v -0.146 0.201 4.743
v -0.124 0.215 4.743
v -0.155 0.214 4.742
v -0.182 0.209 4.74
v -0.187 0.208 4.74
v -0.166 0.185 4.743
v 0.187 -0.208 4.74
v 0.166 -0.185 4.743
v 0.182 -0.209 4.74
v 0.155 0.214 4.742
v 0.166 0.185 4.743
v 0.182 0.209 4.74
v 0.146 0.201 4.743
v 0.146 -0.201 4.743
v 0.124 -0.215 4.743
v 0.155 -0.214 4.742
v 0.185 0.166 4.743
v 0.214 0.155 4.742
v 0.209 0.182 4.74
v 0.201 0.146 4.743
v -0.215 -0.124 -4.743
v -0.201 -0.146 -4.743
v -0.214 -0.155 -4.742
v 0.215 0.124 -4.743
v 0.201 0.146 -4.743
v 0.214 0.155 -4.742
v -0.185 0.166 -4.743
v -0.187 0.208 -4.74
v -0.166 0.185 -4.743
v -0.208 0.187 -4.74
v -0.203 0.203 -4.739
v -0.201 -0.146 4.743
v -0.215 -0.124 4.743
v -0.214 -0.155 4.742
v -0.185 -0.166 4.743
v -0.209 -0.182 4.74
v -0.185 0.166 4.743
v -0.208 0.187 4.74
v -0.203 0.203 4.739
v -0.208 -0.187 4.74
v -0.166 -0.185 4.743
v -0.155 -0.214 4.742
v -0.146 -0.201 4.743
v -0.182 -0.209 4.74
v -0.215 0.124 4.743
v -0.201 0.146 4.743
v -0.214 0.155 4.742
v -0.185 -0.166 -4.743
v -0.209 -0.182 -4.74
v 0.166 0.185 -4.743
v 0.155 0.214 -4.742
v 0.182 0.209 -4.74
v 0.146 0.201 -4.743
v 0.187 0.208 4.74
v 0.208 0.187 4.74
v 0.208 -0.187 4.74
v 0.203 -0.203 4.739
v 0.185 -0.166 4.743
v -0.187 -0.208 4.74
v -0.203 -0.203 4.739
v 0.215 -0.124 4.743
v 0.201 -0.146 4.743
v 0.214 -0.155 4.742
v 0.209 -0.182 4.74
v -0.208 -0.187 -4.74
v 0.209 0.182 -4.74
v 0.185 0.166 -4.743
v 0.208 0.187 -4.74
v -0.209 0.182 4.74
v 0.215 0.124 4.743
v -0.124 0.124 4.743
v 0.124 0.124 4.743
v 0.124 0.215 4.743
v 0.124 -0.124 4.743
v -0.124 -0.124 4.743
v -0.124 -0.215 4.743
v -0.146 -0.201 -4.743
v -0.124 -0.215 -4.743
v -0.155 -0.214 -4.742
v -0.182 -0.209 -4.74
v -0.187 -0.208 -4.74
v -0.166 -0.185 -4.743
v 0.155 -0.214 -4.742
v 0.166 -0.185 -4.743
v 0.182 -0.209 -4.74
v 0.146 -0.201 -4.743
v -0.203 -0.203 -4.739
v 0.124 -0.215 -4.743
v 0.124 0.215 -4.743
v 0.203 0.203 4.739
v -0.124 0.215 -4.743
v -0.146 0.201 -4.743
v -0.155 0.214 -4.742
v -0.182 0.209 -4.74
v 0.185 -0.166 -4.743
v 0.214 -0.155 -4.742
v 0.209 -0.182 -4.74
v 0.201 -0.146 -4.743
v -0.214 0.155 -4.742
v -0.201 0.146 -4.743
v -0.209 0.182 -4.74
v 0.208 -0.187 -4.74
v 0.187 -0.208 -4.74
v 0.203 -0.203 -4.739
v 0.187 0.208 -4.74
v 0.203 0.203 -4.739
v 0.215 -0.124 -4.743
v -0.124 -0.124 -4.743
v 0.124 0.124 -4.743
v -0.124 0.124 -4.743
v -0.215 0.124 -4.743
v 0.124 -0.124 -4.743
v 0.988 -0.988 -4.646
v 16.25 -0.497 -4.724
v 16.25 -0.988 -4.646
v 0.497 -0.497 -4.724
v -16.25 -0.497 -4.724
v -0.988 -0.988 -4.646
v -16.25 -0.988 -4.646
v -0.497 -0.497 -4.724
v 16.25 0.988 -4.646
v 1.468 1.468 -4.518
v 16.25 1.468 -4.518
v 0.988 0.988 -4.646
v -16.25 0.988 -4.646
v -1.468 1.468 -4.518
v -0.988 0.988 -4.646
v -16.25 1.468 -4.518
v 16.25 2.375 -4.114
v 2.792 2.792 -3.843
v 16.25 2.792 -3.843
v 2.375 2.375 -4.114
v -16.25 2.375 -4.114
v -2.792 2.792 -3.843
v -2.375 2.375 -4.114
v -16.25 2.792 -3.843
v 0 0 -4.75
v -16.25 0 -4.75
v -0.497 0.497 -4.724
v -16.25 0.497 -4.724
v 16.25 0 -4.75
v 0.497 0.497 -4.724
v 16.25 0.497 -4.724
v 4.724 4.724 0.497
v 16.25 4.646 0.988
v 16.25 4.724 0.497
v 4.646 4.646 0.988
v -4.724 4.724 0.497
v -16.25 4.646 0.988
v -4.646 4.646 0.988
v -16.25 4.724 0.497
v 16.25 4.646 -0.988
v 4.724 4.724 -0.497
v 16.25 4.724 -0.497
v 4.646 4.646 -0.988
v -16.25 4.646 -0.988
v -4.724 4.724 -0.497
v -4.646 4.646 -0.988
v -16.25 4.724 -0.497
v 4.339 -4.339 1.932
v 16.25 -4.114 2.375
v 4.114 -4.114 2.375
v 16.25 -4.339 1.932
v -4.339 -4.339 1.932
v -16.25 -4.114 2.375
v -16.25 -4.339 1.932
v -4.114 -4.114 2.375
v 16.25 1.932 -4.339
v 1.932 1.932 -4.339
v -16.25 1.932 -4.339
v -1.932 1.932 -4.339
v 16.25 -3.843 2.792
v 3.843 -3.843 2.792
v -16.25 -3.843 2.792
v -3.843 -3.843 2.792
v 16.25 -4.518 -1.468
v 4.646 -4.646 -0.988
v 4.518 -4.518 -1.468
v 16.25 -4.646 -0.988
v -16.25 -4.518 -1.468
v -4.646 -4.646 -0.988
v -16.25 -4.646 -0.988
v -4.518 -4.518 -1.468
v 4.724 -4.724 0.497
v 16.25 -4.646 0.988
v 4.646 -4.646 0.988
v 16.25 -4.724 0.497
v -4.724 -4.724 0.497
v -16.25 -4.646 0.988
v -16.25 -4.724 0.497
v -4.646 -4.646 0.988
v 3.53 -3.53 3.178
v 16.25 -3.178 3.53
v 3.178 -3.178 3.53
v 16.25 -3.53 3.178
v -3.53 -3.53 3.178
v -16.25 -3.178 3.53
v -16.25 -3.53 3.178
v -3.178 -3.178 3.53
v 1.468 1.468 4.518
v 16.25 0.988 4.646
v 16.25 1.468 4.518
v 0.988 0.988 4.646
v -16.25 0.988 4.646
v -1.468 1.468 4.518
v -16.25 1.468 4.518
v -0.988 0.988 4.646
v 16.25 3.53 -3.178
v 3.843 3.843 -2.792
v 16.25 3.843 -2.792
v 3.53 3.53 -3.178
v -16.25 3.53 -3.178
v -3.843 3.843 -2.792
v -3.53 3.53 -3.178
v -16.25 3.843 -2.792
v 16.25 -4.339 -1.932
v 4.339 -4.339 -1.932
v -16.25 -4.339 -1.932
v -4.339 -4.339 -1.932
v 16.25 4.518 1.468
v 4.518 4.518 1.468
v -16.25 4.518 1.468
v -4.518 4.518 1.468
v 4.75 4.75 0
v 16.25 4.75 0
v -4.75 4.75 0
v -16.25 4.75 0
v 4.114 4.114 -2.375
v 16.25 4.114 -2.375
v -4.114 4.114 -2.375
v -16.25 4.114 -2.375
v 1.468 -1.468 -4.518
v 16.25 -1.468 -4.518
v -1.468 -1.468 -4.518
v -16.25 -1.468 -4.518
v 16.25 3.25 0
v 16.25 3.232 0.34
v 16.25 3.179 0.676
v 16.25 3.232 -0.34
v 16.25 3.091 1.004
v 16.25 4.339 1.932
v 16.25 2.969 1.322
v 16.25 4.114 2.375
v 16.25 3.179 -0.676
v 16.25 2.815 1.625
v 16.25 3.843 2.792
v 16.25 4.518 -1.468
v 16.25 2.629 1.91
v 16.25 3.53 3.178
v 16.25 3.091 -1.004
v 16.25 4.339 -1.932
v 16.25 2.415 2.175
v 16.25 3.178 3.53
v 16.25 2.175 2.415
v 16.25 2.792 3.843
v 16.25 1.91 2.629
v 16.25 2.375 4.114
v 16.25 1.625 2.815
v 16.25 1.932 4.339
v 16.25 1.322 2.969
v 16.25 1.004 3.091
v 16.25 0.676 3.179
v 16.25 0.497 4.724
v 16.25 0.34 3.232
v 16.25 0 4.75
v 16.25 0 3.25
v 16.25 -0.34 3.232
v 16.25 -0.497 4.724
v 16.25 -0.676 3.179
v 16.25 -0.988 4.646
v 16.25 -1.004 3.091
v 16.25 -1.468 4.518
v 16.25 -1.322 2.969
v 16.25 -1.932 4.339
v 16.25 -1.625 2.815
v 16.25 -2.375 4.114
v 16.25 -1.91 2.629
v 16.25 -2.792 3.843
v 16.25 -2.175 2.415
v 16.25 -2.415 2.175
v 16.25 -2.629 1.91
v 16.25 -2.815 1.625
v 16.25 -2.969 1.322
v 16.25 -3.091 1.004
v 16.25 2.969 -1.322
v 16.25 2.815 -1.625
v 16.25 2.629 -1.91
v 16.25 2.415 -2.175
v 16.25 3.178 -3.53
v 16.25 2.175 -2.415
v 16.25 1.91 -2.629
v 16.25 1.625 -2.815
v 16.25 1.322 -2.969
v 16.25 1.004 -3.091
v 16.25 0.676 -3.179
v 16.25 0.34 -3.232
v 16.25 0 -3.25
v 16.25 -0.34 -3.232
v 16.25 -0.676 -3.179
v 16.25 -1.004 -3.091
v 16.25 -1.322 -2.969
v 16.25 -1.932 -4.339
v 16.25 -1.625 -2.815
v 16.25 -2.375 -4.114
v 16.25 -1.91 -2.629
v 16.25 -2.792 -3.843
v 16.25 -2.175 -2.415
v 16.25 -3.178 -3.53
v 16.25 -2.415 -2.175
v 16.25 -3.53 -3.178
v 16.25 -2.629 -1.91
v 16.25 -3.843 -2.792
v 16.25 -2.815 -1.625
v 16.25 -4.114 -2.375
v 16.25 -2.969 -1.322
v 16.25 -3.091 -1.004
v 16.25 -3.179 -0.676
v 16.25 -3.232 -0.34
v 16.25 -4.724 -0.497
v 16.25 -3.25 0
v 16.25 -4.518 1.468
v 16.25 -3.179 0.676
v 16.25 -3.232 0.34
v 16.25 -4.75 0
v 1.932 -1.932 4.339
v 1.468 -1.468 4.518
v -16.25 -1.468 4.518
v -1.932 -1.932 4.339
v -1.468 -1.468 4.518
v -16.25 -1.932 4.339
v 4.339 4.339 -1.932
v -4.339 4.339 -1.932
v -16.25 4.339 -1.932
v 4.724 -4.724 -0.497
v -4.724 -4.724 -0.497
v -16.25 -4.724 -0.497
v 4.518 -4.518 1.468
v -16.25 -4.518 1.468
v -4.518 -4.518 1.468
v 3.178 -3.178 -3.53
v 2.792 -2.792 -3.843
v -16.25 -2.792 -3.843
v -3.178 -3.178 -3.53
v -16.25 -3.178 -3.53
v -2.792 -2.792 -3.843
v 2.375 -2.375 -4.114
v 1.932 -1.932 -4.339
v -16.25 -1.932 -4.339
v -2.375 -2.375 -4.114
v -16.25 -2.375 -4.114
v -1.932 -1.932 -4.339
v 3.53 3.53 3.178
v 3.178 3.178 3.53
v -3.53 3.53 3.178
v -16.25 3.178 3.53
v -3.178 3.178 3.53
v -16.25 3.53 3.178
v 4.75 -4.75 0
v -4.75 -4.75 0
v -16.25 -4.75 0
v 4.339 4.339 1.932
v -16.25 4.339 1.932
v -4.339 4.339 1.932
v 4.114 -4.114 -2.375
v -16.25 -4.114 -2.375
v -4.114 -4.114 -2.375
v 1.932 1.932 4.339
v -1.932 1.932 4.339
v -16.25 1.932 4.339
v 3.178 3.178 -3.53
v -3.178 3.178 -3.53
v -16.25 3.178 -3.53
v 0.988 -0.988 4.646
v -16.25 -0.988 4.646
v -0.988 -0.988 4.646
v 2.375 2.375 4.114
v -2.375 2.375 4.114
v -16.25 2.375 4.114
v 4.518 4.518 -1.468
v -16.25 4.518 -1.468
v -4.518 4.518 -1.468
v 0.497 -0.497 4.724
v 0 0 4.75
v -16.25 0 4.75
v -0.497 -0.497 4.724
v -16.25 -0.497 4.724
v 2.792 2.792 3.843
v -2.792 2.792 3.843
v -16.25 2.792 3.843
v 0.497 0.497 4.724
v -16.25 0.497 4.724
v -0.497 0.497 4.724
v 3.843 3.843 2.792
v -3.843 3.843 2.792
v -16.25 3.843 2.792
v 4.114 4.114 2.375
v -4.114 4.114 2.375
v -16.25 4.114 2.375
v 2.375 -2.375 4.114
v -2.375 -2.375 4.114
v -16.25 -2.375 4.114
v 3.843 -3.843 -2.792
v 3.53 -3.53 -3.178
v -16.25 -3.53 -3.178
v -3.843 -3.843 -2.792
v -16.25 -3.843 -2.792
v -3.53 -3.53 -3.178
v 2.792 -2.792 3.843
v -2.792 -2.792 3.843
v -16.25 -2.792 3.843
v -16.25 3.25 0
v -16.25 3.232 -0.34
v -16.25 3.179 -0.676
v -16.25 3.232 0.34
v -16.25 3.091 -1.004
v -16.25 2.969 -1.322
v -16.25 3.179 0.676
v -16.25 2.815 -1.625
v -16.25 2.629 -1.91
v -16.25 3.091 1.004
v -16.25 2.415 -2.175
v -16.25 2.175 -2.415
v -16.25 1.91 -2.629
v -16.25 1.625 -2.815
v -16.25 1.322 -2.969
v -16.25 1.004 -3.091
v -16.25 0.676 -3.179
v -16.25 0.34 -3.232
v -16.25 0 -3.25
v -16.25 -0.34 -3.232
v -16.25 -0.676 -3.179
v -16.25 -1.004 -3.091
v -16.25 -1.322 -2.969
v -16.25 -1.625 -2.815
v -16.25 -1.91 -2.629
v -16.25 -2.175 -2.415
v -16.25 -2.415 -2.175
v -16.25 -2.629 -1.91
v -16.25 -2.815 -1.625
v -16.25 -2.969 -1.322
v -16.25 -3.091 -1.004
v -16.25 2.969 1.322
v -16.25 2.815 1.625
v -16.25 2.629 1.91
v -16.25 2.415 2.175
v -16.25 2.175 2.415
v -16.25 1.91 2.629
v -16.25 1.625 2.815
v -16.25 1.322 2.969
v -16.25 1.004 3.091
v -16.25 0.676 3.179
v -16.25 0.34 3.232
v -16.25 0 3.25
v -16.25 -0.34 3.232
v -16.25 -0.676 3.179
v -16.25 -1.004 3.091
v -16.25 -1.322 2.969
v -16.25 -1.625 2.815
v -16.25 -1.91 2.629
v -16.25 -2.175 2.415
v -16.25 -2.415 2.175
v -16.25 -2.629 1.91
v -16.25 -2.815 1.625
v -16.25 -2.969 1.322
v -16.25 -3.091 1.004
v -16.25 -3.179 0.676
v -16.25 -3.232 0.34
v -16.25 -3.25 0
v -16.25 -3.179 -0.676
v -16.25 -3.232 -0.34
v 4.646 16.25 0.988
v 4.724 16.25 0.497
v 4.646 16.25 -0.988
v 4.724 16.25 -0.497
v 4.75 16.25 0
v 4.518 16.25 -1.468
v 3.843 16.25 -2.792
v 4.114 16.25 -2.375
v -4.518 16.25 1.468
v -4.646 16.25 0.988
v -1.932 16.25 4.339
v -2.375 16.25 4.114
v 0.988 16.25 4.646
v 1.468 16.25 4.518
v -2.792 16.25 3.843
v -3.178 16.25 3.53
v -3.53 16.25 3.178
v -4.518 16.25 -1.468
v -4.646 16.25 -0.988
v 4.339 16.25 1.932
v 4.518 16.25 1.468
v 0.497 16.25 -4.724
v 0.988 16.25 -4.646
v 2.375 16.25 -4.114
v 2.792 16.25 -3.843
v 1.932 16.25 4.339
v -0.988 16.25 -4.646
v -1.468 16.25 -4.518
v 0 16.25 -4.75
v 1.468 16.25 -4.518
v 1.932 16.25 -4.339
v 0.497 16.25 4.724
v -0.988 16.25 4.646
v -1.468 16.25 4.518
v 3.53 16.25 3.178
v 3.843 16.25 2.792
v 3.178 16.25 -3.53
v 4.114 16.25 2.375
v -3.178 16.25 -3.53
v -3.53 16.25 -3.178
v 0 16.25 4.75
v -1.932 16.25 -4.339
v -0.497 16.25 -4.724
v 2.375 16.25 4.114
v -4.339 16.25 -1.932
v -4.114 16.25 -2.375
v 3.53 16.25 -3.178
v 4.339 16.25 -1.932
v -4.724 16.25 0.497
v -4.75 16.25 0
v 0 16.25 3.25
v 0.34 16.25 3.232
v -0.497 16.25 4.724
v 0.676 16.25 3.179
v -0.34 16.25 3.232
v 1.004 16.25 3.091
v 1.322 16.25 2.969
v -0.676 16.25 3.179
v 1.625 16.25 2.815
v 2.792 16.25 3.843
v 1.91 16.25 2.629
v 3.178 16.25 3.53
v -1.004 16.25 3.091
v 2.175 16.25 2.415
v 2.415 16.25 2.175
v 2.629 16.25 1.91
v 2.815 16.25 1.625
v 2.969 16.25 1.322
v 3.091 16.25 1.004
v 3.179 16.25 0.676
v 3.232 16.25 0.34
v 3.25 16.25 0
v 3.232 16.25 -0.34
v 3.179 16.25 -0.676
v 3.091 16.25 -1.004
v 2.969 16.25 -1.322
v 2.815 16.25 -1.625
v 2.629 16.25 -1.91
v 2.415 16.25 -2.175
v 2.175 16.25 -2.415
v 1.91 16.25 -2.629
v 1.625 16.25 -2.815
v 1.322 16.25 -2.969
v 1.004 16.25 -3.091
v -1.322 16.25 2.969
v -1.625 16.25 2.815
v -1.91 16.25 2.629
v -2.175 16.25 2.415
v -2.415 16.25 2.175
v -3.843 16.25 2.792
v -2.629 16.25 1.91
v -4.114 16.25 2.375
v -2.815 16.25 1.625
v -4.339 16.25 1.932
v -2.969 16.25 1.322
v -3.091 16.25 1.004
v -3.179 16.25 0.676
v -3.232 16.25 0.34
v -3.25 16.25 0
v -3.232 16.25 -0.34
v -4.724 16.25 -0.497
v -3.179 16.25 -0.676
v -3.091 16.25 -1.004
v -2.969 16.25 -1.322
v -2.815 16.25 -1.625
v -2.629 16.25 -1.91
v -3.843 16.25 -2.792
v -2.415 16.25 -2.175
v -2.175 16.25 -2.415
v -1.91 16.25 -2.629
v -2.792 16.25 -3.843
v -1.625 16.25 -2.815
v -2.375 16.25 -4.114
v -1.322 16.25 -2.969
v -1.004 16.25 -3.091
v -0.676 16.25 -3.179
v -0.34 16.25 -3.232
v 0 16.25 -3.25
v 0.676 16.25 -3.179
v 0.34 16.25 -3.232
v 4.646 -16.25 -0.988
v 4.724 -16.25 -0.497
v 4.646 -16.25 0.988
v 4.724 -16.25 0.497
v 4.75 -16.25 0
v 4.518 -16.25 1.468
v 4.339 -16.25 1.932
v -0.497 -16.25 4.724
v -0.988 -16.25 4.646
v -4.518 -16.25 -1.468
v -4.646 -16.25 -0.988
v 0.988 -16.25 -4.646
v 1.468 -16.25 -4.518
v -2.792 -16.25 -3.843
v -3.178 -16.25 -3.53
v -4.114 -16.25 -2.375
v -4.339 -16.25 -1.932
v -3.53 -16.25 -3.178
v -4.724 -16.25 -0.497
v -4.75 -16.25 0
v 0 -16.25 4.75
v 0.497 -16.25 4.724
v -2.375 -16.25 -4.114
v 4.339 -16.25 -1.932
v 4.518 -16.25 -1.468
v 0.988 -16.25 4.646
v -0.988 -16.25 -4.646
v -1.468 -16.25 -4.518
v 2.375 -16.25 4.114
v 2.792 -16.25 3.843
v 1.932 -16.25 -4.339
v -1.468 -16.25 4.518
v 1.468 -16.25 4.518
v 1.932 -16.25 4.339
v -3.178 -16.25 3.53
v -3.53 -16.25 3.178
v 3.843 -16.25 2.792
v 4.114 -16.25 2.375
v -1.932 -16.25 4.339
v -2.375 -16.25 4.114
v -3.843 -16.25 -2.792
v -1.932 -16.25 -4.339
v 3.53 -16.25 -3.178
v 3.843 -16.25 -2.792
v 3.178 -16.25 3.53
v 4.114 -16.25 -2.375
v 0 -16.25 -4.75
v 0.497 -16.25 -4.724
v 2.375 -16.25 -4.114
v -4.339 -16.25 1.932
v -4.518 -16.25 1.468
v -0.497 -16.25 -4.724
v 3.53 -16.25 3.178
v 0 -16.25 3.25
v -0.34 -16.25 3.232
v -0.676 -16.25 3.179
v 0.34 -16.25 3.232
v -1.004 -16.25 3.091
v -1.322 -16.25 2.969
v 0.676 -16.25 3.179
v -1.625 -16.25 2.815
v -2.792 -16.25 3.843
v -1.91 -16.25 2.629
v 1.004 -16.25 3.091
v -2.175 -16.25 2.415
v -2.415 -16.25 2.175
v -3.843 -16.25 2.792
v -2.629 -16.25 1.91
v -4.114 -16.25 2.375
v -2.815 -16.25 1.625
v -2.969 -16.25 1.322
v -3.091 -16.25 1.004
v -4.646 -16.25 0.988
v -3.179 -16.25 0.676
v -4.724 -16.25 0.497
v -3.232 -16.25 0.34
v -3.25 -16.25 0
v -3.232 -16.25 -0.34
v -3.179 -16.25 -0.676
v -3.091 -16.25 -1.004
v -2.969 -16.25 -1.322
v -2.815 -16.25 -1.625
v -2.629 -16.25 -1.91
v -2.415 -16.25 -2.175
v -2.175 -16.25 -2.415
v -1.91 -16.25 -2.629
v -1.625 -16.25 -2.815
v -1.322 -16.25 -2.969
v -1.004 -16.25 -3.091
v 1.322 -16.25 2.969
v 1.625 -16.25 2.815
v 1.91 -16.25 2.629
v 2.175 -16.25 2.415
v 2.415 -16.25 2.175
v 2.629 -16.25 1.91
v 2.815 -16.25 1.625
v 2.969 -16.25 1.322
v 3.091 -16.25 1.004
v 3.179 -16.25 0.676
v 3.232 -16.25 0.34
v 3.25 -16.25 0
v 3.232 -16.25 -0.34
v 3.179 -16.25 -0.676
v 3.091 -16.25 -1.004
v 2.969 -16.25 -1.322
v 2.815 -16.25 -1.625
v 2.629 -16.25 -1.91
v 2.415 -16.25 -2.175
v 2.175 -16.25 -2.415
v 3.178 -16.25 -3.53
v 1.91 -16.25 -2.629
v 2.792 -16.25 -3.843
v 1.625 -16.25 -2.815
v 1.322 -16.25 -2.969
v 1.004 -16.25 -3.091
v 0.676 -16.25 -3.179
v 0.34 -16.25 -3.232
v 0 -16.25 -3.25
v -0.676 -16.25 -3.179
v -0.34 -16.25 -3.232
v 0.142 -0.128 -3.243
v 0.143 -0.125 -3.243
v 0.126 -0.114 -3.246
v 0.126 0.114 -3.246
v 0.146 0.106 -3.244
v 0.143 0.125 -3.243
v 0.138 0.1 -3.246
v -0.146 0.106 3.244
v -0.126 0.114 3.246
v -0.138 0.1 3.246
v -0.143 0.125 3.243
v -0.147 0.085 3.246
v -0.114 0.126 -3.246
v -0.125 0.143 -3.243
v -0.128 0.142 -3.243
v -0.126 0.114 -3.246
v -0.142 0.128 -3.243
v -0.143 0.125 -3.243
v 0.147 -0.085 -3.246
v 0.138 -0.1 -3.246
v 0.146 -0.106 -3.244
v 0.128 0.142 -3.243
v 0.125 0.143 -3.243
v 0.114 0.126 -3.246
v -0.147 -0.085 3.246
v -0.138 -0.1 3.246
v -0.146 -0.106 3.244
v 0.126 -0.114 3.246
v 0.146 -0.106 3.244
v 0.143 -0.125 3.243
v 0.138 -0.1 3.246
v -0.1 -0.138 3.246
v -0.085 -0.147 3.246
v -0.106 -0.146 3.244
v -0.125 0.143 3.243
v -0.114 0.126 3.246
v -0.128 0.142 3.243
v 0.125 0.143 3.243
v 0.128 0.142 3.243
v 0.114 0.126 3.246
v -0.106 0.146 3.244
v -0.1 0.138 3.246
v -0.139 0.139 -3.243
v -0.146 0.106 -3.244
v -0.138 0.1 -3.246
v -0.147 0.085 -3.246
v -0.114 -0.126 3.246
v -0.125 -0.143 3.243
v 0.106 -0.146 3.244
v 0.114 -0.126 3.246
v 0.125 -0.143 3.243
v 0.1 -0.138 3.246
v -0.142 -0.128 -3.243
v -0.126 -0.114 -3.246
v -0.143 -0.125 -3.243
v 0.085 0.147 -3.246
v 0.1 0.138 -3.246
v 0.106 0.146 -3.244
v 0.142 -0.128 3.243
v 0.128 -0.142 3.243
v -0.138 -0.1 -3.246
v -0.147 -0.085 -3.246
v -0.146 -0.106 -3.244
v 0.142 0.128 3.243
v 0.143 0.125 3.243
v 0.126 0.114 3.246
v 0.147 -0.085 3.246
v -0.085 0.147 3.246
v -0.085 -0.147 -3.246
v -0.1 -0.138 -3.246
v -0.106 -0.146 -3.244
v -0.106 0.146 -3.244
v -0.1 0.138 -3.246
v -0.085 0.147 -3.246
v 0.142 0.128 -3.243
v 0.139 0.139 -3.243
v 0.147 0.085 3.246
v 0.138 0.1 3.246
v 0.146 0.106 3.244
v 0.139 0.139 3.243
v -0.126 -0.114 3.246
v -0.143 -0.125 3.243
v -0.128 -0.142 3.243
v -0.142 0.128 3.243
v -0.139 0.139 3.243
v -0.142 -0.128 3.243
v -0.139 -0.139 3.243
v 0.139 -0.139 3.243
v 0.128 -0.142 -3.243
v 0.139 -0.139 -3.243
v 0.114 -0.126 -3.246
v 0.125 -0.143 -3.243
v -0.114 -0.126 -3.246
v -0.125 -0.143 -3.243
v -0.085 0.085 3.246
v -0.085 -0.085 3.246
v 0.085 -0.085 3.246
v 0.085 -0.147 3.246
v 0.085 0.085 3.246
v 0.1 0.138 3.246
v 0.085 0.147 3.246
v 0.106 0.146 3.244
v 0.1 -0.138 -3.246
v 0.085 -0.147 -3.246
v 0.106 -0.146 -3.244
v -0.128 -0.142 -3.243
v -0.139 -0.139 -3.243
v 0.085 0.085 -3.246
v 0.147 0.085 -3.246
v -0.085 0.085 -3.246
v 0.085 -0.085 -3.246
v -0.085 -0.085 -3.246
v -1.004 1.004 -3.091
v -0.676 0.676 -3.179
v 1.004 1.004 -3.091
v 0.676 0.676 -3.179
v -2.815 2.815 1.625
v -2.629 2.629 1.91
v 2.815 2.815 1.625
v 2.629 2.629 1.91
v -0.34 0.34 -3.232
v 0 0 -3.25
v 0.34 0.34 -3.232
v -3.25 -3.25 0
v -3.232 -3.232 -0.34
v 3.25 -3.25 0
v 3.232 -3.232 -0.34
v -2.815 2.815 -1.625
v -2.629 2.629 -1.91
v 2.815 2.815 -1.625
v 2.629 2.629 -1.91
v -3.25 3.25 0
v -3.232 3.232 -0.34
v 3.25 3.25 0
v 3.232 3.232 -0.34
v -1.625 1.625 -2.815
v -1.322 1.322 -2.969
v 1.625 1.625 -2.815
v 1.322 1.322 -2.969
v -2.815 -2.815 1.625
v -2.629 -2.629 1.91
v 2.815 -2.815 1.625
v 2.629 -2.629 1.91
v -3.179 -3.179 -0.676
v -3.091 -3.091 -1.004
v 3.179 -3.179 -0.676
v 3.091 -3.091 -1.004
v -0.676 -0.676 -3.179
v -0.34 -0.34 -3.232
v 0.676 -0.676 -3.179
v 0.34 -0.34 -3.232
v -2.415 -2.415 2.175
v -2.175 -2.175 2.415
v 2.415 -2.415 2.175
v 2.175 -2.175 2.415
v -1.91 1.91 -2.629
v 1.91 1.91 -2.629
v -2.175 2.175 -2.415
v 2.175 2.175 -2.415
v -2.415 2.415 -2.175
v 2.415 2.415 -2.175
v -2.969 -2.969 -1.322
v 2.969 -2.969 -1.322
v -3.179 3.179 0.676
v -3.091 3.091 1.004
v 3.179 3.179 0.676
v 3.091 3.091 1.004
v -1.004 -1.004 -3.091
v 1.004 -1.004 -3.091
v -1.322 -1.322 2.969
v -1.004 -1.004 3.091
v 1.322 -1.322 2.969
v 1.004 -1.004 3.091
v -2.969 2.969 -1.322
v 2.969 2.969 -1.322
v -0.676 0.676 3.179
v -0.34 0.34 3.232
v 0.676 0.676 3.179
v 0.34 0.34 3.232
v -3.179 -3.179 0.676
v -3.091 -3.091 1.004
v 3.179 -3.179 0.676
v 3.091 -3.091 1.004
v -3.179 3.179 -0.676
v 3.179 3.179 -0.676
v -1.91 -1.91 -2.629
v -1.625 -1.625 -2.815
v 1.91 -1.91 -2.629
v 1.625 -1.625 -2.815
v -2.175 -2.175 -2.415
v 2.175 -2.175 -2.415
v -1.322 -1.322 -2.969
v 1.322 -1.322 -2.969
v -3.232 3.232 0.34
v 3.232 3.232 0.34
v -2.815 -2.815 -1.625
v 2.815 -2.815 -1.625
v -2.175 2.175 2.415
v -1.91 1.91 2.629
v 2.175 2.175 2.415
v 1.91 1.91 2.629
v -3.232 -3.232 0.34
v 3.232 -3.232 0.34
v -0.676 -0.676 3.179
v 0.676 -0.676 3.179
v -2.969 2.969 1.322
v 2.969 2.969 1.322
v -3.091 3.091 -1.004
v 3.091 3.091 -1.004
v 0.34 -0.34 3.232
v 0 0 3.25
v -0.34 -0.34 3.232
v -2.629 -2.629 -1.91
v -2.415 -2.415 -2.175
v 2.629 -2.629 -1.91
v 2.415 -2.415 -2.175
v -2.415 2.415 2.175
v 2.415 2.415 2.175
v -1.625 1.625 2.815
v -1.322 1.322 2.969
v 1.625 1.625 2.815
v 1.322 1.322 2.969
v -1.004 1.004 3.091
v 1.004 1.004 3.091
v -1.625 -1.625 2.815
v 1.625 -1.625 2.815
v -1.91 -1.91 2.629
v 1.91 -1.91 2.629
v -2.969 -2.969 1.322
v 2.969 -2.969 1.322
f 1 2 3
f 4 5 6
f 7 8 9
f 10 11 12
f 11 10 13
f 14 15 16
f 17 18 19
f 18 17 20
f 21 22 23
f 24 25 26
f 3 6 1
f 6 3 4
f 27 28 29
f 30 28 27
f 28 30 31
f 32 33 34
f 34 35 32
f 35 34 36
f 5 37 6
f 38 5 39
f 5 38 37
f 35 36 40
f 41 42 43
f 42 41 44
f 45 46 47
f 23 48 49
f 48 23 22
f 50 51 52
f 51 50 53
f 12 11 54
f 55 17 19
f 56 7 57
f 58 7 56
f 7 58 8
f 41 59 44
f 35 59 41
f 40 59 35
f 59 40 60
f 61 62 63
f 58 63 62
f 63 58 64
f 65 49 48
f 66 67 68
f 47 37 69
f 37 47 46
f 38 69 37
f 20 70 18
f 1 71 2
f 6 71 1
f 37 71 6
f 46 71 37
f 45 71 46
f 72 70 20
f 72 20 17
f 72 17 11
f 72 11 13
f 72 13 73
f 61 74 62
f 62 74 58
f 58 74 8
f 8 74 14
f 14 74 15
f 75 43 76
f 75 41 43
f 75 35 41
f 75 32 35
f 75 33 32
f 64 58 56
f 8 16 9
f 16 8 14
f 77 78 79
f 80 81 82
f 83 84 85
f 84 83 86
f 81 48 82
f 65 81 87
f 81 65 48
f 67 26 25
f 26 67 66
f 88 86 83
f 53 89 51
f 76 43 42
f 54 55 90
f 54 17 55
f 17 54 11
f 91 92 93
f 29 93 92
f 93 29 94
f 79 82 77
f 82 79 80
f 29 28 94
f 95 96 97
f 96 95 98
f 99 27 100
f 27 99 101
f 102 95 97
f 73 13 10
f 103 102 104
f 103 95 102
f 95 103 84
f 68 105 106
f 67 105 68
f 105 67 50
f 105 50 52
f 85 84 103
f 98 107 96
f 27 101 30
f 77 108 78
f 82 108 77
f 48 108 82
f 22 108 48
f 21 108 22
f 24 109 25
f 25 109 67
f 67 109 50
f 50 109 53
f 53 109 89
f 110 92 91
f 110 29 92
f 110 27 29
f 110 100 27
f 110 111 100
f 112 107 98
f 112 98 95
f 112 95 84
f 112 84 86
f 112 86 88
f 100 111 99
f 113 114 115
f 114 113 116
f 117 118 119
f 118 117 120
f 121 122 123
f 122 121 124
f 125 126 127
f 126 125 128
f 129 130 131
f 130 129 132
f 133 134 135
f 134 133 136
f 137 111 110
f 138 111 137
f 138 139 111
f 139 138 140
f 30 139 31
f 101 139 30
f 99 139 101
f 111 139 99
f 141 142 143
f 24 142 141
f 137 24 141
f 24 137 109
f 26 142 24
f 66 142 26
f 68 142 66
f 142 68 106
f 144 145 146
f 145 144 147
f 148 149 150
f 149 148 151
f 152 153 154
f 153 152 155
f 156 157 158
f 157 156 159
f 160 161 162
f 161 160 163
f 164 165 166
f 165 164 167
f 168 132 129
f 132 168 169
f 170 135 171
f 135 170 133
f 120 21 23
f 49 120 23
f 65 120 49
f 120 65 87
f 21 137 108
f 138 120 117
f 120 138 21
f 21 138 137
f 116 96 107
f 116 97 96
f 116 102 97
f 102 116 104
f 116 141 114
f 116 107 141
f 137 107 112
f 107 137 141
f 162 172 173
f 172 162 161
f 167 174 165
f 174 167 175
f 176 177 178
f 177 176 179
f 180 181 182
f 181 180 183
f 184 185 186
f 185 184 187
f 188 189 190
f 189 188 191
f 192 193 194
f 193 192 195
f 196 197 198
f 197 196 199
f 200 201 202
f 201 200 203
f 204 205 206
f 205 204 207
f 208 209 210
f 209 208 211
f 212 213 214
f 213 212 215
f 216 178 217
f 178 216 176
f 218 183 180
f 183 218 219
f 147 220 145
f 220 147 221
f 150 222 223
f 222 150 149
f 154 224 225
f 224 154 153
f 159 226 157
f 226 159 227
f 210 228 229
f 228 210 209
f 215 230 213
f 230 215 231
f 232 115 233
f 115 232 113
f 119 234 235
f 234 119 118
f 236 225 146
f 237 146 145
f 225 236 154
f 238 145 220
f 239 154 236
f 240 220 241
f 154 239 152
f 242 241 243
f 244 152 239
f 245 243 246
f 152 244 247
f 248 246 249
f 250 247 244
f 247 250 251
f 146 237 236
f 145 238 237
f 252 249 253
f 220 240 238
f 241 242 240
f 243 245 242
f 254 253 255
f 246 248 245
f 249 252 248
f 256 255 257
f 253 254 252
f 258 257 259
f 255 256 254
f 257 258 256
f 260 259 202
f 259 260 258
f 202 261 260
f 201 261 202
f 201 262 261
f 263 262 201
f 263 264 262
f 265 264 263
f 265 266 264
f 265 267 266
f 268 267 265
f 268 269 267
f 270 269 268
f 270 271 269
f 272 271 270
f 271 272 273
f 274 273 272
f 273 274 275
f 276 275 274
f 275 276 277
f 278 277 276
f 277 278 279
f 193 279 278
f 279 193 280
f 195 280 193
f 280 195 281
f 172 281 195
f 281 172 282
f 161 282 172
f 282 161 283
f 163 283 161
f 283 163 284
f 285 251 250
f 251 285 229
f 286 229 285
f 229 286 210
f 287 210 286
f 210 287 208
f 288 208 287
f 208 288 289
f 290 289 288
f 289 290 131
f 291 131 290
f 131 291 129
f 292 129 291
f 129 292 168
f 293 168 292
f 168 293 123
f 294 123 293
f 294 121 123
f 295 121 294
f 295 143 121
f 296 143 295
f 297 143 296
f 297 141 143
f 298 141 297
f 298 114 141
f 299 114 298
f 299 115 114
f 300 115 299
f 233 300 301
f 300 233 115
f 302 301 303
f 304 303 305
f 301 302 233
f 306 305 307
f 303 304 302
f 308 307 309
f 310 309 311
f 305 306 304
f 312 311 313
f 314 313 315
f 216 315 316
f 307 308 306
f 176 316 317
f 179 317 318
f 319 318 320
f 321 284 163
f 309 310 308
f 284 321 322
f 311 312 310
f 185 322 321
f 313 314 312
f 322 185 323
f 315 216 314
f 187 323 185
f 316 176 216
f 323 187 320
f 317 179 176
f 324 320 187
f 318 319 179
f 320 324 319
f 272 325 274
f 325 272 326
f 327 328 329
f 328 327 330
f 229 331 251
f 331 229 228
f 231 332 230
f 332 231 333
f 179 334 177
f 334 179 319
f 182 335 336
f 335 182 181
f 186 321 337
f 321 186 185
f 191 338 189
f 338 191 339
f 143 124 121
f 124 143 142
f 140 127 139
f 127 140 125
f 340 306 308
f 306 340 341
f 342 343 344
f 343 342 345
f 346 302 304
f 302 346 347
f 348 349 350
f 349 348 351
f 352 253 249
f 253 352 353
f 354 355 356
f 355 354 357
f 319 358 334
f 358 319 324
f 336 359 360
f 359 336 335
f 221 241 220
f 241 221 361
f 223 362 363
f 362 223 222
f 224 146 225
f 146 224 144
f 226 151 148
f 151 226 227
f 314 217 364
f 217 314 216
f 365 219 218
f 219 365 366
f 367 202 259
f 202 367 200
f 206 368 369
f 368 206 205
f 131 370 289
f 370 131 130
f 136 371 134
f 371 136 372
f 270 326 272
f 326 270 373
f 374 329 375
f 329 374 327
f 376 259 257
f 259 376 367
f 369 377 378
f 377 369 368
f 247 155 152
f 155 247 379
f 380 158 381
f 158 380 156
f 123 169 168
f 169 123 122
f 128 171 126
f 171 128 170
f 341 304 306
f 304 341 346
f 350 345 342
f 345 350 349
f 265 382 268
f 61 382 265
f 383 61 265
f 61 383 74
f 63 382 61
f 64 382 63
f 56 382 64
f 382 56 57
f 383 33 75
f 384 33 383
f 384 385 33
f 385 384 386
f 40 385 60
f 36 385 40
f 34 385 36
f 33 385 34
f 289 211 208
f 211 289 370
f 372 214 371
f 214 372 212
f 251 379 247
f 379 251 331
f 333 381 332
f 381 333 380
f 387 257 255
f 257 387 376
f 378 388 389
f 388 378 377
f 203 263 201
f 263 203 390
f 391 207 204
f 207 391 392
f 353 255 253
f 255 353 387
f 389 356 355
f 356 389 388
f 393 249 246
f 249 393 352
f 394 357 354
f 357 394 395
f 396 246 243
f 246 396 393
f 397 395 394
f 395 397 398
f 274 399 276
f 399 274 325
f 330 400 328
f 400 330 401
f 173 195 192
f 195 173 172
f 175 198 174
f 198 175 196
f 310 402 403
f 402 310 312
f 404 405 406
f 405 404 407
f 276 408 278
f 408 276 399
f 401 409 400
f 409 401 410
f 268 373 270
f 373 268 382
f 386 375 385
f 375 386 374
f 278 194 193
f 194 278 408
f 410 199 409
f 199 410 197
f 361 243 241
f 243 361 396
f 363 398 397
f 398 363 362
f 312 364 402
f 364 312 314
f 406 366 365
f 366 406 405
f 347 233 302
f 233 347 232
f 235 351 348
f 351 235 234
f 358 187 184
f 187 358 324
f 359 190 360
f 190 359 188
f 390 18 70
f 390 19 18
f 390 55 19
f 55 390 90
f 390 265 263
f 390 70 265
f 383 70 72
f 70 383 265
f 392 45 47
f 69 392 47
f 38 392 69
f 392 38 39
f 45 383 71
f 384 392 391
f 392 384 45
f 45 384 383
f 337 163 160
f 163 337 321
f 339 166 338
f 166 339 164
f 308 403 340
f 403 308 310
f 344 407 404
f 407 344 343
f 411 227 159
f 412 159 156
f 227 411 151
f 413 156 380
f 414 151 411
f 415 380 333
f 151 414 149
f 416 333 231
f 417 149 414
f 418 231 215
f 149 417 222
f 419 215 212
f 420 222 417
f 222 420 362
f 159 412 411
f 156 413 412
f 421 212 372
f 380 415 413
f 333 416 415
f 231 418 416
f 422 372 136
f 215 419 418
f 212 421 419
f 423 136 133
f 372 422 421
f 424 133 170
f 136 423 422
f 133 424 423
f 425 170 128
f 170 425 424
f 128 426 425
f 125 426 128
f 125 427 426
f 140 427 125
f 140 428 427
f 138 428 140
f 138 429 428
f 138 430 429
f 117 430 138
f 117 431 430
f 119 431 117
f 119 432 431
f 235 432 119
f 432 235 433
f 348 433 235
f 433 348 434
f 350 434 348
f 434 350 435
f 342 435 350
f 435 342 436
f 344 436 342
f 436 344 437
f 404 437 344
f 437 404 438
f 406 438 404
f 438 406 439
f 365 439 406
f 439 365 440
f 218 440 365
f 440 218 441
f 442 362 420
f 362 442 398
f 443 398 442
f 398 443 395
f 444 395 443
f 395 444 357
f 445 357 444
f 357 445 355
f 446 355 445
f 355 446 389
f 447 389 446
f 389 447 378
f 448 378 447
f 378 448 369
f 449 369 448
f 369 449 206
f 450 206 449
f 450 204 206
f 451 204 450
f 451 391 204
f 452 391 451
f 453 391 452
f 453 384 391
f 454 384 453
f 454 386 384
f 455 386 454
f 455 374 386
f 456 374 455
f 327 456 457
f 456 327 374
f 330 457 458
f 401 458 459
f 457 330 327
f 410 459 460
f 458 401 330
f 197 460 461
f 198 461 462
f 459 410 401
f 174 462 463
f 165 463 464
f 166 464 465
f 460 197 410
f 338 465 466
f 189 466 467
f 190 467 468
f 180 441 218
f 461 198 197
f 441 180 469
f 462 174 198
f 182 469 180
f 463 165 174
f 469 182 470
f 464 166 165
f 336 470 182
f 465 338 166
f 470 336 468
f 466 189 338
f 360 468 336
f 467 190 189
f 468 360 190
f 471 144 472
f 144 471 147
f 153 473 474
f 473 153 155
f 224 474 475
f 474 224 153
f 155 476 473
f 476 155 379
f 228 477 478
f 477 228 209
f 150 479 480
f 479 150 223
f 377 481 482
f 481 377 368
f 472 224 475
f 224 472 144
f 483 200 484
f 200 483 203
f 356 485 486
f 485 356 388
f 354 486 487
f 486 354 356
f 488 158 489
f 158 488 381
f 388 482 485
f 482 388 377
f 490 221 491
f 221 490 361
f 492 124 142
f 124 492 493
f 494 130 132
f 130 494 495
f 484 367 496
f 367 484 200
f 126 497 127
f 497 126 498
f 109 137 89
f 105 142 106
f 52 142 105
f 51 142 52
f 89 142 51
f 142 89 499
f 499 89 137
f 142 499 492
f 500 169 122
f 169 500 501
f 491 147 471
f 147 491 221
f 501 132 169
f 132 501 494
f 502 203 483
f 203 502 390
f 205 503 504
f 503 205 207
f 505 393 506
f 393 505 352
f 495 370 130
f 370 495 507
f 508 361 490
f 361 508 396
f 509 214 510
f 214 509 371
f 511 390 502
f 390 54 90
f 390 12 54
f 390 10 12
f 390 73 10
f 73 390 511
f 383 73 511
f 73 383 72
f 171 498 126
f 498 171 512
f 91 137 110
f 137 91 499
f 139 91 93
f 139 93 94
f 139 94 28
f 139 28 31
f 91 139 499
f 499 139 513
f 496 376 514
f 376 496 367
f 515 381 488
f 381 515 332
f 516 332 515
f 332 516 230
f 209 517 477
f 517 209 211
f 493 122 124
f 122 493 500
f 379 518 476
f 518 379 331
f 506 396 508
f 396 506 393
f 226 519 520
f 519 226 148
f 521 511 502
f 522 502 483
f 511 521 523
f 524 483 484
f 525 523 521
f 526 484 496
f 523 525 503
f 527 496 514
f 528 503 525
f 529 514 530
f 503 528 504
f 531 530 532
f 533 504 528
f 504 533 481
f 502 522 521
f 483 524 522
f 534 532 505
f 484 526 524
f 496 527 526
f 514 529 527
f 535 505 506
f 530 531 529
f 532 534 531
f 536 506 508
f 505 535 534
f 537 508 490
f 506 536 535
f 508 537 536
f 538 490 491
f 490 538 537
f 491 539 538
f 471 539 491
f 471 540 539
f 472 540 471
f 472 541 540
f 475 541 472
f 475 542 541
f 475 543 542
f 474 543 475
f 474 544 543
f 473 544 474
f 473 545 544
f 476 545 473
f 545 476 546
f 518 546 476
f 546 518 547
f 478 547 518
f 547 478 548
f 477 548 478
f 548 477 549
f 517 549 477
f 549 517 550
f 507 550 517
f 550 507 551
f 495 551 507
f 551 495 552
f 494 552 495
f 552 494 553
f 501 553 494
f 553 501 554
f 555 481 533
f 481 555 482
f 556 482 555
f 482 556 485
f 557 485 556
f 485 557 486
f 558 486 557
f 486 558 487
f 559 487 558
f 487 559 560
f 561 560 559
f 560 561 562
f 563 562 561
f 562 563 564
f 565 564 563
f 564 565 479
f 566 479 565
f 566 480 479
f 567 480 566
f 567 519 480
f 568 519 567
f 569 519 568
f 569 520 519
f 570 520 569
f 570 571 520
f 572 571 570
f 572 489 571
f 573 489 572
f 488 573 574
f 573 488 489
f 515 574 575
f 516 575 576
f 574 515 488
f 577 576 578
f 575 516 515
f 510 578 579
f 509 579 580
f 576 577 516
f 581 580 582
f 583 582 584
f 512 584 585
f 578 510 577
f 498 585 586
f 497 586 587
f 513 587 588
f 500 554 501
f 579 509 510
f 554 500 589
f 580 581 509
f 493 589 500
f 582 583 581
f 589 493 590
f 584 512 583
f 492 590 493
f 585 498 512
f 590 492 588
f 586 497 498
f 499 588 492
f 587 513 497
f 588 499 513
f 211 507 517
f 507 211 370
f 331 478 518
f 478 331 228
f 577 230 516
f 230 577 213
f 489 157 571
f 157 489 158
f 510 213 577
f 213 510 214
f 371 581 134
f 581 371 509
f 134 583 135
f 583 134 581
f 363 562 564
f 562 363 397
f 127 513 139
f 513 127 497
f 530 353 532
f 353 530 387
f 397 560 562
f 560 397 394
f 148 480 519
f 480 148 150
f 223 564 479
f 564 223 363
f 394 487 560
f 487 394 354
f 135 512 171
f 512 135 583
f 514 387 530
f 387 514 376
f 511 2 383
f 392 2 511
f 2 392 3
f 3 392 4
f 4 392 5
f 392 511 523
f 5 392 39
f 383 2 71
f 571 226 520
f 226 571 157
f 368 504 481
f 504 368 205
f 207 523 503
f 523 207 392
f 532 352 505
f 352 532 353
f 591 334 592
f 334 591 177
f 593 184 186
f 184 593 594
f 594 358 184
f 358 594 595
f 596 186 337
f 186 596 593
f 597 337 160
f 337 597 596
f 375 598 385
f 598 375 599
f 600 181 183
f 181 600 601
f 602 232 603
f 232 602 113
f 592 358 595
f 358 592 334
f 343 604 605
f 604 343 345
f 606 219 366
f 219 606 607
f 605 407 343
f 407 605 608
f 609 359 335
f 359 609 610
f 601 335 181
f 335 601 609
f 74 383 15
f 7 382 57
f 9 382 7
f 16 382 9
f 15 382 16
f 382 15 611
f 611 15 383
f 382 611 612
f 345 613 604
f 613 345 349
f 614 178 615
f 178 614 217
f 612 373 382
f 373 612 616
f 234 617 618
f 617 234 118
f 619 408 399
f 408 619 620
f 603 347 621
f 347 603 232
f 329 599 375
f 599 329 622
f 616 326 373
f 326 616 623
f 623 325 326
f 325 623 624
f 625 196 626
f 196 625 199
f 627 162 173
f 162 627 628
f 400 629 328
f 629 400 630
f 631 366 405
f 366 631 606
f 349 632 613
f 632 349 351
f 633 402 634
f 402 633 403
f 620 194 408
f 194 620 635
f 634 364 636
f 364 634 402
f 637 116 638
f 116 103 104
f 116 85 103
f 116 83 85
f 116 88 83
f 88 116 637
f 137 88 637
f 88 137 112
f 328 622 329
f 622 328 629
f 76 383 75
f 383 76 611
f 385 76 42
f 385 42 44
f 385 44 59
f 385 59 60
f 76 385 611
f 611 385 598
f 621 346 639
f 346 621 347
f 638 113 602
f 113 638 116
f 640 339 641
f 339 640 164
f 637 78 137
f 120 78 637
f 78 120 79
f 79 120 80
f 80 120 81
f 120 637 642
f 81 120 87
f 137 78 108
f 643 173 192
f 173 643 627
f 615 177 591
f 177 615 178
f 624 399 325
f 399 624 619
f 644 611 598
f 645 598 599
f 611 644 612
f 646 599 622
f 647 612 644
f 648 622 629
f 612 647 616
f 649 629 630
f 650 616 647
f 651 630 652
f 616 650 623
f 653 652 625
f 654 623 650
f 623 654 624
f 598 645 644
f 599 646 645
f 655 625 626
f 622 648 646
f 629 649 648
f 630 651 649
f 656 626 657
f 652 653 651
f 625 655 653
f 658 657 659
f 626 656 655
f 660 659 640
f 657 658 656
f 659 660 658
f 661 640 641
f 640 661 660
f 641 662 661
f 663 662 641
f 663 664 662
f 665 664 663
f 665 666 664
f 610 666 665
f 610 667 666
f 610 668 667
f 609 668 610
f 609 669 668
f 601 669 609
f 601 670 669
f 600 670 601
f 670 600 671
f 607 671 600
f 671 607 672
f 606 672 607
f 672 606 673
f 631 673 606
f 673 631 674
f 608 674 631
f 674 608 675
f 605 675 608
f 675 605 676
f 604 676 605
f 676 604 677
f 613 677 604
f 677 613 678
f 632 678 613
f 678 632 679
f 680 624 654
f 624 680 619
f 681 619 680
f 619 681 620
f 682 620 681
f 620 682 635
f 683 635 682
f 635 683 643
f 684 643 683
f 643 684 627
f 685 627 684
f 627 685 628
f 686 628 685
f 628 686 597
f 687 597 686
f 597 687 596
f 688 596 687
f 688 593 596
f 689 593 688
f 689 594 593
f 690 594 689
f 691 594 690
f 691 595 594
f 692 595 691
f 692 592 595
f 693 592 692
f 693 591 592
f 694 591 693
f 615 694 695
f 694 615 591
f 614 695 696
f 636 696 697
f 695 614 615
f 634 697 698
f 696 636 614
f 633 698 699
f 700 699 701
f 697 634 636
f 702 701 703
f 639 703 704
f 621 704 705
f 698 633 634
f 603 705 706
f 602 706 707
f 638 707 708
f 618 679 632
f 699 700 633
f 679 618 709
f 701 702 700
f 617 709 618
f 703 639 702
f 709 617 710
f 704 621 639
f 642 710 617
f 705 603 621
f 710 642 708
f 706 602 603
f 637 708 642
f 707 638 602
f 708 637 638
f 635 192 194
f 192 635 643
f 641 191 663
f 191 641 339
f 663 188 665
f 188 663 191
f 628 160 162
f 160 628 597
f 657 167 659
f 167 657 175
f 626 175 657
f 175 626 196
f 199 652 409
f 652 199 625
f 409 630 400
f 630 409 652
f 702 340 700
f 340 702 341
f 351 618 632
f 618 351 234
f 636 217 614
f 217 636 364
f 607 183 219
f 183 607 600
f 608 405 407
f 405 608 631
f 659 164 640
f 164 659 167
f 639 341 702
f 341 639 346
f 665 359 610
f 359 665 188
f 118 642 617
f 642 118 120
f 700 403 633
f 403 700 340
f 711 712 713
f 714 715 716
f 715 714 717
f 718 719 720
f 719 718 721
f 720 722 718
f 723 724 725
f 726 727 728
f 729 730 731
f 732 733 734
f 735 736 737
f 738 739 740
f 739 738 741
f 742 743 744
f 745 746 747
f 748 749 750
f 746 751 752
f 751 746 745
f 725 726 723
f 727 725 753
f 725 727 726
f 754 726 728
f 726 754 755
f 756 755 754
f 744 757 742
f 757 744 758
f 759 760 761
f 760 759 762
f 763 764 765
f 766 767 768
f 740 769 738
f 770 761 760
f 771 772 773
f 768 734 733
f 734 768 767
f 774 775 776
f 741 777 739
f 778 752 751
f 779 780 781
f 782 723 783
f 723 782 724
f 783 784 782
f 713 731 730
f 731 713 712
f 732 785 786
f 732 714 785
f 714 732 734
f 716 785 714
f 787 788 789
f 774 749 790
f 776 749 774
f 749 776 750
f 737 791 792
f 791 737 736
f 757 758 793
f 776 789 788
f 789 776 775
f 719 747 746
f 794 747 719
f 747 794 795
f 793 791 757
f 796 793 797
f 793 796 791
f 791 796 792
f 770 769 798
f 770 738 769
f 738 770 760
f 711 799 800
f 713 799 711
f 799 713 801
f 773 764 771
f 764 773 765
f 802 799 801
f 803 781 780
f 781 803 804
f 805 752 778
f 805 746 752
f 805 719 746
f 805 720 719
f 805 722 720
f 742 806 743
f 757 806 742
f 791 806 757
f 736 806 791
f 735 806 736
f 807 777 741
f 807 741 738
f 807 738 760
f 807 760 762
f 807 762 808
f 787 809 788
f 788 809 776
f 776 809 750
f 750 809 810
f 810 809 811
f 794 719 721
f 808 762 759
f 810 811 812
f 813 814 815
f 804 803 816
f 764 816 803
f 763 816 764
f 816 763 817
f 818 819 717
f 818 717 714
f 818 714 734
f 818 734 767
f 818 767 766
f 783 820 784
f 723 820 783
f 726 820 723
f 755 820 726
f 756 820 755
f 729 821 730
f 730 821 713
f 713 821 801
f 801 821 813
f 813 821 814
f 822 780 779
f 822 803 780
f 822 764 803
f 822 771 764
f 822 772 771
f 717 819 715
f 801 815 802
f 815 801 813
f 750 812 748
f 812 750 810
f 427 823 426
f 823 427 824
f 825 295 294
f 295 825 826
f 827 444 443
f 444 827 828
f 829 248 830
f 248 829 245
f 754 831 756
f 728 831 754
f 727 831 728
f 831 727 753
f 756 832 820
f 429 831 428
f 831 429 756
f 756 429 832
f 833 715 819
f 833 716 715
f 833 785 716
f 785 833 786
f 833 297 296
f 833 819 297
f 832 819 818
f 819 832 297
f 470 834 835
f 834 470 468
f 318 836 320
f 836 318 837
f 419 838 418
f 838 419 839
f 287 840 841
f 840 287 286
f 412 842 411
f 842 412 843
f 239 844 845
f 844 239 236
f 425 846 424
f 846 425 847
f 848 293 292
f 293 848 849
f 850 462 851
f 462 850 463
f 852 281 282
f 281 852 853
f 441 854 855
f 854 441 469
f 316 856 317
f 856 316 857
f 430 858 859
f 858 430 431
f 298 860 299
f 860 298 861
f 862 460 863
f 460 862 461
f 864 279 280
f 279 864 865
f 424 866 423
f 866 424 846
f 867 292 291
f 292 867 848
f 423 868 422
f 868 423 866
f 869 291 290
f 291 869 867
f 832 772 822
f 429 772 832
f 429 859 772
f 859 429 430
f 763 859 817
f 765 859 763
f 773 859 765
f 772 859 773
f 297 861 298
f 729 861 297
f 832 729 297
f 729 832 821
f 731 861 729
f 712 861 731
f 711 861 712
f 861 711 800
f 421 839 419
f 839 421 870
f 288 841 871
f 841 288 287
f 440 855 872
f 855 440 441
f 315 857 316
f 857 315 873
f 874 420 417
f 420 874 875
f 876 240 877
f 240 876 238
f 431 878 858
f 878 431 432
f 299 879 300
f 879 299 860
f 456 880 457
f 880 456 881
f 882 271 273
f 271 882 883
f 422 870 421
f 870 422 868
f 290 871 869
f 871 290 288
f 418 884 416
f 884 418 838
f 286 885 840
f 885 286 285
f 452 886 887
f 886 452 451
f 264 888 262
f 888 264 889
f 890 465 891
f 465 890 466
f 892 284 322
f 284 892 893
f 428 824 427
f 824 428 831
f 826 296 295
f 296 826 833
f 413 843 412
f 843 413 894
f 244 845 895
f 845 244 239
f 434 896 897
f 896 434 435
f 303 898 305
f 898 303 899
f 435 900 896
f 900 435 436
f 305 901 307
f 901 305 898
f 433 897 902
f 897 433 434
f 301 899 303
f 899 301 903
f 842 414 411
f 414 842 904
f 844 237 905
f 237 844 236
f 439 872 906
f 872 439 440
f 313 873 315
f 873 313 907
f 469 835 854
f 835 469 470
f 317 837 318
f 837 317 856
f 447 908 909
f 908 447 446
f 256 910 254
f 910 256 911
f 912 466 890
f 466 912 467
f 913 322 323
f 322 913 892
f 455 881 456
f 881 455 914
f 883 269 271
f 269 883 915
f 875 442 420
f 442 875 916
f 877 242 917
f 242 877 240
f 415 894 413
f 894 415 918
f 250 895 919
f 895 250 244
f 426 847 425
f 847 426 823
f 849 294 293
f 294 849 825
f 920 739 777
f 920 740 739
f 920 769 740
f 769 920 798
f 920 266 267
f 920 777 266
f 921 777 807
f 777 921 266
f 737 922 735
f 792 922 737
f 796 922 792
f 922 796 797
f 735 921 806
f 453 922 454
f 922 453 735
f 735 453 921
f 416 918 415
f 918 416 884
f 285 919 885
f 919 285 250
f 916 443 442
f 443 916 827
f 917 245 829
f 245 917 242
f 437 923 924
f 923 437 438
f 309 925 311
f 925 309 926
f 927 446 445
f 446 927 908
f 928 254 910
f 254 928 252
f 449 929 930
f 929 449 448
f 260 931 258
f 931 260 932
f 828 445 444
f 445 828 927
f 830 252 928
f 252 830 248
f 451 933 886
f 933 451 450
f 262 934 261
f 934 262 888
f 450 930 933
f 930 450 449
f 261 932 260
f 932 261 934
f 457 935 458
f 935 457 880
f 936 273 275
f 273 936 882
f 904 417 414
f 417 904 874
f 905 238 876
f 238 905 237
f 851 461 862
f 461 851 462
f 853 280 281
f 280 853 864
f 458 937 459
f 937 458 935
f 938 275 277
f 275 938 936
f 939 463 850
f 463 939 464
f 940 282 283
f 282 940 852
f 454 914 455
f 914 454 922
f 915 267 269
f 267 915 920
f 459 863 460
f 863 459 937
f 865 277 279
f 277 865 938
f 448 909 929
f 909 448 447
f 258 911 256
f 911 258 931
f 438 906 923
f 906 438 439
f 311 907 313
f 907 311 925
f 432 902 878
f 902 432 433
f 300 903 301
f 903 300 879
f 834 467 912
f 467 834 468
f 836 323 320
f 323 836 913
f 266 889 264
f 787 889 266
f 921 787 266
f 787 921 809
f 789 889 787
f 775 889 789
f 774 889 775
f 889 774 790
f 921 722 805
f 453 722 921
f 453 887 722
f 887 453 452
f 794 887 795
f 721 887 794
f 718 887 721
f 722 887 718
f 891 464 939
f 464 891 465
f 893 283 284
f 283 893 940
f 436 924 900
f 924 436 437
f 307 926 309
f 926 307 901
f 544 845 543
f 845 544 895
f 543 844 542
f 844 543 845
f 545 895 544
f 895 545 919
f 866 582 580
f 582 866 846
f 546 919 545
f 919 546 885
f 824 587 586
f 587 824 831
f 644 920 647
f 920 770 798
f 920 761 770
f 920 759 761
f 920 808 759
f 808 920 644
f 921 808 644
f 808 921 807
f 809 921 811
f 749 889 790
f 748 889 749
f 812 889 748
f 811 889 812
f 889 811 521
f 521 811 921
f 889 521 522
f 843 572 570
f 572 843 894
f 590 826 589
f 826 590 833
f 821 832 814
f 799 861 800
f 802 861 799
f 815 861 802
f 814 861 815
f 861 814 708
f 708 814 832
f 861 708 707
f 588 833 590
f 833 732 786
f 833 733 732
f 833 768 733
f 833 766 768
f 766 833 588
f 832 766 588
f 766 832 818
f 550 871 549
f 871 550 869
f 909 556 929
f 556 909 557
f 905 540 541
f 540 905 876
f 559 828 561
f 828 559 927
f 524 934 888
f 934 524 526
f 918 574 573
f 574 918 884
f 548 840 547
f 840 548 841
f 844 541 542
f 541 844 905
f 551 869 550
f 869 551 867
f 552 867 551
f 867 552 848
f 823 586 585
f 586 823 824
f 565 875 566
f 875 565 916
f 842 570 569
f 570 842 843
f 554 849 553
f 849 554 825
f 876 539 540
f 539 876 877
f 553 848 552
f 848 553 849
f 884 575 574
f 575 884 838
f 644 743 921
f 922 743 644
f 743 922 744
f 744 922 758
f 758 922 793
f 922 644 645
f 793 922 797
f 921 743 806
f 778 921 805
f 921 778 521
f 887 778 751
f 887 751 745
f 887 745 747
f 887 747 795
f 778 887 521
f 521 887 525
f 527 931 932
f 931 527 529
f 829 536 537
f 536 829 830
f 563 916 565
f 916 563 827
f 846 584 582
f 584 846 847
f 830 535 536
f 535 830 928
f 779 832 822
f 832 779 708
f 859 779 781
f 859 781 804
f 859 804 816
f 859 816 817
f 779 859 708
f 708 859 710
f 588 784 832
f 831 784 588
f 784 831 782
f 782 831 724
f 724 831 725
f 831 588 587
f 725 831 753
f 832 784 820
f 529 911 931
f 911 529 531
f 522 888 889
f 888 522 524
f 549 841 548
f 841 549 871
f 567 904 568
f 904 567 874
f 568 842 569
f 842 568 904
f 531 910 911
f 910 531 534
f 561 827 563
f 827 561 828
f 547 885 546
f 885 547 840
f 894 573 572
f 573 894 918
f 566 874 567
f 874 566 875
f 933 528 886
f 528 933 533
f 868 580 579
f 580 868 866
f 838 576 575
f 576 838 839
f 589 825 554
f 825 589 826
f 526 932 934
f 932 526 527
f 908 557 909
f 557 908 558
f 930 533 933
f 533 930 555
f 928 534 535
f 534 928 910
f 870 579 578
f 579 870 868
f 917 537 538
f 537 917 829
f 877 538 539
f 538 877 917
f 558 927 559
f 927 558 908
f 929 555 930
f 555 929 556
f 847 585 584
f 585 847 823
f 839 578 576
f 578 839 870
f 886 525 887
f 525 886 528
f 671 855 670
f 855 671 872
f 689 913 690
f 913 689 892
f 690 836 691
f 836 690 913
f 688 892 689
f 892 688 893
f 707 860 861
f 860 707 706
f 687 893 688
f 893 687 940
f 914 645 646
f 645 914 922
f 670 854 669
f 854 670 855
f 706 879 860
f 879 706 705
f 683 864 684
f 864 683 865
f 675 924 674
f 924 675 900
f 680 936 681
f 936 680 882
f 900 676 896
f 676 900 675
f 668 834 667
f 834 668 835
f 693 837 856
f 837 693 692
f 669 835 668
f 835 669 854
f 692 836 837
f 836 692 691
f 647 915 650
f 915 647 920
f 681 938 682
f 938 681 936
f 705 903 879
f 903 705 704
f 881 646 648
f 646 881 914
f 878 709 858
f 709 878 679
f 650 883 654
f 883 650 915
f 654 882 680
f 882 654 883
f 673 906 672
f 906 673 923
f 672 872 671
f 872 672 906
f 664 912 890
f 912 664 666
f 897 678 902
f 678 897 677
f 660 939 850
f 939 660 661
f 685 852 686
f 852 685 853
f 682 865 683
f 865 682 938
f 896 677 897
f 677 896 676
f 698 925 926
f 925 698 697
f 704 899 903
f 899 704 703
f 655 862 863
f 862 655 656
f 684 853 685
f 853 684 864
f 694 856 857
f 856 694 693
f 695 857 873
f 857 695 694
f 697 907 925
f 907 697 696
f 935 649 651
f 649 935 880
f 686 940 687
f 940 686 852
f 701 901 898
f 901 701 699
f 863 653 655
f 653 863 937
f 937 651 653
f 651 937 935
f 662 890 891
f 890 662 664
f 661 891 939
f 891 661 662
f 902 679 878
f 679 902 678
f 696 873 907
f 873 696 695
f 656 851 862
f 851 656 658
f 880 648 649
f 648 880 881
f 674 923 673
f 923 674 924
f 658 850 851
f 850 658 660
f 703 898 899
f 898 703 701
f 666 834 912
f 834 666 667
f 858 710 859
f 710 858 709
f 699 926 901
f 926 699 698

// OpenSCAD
// Beam Joint

//=======================================================================
// Config
//=======================================================================
//hole inner diameter
id=6.5;

//wall thickness main cross beam
wall=1.5; //1mm is too thin: cross breaks before beam

//socket depth for axis direction, set to 0 for no socket
//as a rule, make socket 2*id deep

/* 
// T
socketXp=0.5*id; //positive X axis
socketXn=0.5*id; //negative X axis
socketYp=2*id; //positive Y axis
socketYn=0*id; //negative Y axis
socketZp=0*id; //positive Z axis
socketZn=0*id; //negative Z axis
*/

// Cross
socketXp=2*id; //positive X axis
socketXn=2*id; //negative X axis
socketYp=2*id; //positive Y axis
socketYn=2*id; //negative Y axis
socketZp=0*id; //positive Z axis
socketZn=0*id; //negative Z axis

//use hull?
use_hull=0;

//flat top/bottom?
use_flat_bottom=0;
use_flat_top=0;

//=======================================================================

$fn=60; //number of fragments
tol = 0.001; //tolerance
od = id+2*wall; //outside diameter
or = od/2; //outside radius
ir = id/2; //inner radius

X = [1,0,0];
Y = [0,1,0];
Z = [0,0,1];

difference() {
  Cross();
  CrossDrill();
}

//------------------------------------------------------------------------------------------------
module Cross() {
  HullOrUnion() {
    sphere(d=od);
    if(socketXp>0) rotate([0,90,0]) cylinder(h=socketXp+ir,d=od);
    if(socketXn>0) rotate([0,-90,0]) cylinder(h=socketXn+ir,d=od);
    if(socketYp>0) rotate([-90,0,0]) cylinder(h=socketYp+ir,d=od);
    if(socketYn>0) rotate([90,0,0]) cylinder(h=socketYn+ir,d=od);
    if(socketZp>0) cylinder(h=socketZp+or,d=od);
    if(socketZn>0) rotate([180,0,0]) cylinder(h=socketZn+or,d=od);
  }
  if(use_flat_top) {
    zoff = or/2;
    translate([+(socketXp/2),0,zoff]) cube([socketXp+id,od,or],center=true);
    translate([-(socketXn/2),0,zoff]) cube([socketXn+id,od,or],center=true);
    translate([0,+(socketYp/2),zoff]) cube([od,socketYp+id,or],center=true);
    translate([0,-(socketYn/2),zoff]) cube([od,socketYn+id,or],center=true);
  }
  if(use_flat_bottom) {
    zoff = -or/2;
    translate([+(socketXp/2),0,zoff]) cube([socketXp+id,od,or],center=true);
    translate([-(socketXn/2),0,zoff]) cube([socketXn+id,od,or],center=true);
    translate([0,+(socketYp/2),zoff]) cube([od,socketYp+id,or],center=true);
    translate([0,-(socketYn/2),zoff]) cube([od,socketYn+id,or],center=true);
  }
}

module CrossDrill() {
  union() {
    sphere(d=id);
    if(socketXp>0) translate(-tol*X) rotate([0,90,0]) cylinder(h=999,d=id);
    if(socketXn>0) translate(+tol*X) rotate([0,-90,0]) cylinder(h=999,d=id);
    if(socketYp>0) translate(-tol*Y) rotate([-90,0,0]) cylinder(h=999,d=id);
    if(socketYn>0) translate(+tol*Y) rotate([90,0,0]) cylinder(h=999,d=id);
    if(socketZp>0) translate(-tol*Z) cylinder(h=999,d=id);
    if(socketZn>0) translate(+tol*Z) rotate([180,0,0]) cylinder(h=999,d=id);
  }
}

module HullOrUnion() {
  if(use_hull) {
    hull() children();
  }
  else
    union() children();
}
